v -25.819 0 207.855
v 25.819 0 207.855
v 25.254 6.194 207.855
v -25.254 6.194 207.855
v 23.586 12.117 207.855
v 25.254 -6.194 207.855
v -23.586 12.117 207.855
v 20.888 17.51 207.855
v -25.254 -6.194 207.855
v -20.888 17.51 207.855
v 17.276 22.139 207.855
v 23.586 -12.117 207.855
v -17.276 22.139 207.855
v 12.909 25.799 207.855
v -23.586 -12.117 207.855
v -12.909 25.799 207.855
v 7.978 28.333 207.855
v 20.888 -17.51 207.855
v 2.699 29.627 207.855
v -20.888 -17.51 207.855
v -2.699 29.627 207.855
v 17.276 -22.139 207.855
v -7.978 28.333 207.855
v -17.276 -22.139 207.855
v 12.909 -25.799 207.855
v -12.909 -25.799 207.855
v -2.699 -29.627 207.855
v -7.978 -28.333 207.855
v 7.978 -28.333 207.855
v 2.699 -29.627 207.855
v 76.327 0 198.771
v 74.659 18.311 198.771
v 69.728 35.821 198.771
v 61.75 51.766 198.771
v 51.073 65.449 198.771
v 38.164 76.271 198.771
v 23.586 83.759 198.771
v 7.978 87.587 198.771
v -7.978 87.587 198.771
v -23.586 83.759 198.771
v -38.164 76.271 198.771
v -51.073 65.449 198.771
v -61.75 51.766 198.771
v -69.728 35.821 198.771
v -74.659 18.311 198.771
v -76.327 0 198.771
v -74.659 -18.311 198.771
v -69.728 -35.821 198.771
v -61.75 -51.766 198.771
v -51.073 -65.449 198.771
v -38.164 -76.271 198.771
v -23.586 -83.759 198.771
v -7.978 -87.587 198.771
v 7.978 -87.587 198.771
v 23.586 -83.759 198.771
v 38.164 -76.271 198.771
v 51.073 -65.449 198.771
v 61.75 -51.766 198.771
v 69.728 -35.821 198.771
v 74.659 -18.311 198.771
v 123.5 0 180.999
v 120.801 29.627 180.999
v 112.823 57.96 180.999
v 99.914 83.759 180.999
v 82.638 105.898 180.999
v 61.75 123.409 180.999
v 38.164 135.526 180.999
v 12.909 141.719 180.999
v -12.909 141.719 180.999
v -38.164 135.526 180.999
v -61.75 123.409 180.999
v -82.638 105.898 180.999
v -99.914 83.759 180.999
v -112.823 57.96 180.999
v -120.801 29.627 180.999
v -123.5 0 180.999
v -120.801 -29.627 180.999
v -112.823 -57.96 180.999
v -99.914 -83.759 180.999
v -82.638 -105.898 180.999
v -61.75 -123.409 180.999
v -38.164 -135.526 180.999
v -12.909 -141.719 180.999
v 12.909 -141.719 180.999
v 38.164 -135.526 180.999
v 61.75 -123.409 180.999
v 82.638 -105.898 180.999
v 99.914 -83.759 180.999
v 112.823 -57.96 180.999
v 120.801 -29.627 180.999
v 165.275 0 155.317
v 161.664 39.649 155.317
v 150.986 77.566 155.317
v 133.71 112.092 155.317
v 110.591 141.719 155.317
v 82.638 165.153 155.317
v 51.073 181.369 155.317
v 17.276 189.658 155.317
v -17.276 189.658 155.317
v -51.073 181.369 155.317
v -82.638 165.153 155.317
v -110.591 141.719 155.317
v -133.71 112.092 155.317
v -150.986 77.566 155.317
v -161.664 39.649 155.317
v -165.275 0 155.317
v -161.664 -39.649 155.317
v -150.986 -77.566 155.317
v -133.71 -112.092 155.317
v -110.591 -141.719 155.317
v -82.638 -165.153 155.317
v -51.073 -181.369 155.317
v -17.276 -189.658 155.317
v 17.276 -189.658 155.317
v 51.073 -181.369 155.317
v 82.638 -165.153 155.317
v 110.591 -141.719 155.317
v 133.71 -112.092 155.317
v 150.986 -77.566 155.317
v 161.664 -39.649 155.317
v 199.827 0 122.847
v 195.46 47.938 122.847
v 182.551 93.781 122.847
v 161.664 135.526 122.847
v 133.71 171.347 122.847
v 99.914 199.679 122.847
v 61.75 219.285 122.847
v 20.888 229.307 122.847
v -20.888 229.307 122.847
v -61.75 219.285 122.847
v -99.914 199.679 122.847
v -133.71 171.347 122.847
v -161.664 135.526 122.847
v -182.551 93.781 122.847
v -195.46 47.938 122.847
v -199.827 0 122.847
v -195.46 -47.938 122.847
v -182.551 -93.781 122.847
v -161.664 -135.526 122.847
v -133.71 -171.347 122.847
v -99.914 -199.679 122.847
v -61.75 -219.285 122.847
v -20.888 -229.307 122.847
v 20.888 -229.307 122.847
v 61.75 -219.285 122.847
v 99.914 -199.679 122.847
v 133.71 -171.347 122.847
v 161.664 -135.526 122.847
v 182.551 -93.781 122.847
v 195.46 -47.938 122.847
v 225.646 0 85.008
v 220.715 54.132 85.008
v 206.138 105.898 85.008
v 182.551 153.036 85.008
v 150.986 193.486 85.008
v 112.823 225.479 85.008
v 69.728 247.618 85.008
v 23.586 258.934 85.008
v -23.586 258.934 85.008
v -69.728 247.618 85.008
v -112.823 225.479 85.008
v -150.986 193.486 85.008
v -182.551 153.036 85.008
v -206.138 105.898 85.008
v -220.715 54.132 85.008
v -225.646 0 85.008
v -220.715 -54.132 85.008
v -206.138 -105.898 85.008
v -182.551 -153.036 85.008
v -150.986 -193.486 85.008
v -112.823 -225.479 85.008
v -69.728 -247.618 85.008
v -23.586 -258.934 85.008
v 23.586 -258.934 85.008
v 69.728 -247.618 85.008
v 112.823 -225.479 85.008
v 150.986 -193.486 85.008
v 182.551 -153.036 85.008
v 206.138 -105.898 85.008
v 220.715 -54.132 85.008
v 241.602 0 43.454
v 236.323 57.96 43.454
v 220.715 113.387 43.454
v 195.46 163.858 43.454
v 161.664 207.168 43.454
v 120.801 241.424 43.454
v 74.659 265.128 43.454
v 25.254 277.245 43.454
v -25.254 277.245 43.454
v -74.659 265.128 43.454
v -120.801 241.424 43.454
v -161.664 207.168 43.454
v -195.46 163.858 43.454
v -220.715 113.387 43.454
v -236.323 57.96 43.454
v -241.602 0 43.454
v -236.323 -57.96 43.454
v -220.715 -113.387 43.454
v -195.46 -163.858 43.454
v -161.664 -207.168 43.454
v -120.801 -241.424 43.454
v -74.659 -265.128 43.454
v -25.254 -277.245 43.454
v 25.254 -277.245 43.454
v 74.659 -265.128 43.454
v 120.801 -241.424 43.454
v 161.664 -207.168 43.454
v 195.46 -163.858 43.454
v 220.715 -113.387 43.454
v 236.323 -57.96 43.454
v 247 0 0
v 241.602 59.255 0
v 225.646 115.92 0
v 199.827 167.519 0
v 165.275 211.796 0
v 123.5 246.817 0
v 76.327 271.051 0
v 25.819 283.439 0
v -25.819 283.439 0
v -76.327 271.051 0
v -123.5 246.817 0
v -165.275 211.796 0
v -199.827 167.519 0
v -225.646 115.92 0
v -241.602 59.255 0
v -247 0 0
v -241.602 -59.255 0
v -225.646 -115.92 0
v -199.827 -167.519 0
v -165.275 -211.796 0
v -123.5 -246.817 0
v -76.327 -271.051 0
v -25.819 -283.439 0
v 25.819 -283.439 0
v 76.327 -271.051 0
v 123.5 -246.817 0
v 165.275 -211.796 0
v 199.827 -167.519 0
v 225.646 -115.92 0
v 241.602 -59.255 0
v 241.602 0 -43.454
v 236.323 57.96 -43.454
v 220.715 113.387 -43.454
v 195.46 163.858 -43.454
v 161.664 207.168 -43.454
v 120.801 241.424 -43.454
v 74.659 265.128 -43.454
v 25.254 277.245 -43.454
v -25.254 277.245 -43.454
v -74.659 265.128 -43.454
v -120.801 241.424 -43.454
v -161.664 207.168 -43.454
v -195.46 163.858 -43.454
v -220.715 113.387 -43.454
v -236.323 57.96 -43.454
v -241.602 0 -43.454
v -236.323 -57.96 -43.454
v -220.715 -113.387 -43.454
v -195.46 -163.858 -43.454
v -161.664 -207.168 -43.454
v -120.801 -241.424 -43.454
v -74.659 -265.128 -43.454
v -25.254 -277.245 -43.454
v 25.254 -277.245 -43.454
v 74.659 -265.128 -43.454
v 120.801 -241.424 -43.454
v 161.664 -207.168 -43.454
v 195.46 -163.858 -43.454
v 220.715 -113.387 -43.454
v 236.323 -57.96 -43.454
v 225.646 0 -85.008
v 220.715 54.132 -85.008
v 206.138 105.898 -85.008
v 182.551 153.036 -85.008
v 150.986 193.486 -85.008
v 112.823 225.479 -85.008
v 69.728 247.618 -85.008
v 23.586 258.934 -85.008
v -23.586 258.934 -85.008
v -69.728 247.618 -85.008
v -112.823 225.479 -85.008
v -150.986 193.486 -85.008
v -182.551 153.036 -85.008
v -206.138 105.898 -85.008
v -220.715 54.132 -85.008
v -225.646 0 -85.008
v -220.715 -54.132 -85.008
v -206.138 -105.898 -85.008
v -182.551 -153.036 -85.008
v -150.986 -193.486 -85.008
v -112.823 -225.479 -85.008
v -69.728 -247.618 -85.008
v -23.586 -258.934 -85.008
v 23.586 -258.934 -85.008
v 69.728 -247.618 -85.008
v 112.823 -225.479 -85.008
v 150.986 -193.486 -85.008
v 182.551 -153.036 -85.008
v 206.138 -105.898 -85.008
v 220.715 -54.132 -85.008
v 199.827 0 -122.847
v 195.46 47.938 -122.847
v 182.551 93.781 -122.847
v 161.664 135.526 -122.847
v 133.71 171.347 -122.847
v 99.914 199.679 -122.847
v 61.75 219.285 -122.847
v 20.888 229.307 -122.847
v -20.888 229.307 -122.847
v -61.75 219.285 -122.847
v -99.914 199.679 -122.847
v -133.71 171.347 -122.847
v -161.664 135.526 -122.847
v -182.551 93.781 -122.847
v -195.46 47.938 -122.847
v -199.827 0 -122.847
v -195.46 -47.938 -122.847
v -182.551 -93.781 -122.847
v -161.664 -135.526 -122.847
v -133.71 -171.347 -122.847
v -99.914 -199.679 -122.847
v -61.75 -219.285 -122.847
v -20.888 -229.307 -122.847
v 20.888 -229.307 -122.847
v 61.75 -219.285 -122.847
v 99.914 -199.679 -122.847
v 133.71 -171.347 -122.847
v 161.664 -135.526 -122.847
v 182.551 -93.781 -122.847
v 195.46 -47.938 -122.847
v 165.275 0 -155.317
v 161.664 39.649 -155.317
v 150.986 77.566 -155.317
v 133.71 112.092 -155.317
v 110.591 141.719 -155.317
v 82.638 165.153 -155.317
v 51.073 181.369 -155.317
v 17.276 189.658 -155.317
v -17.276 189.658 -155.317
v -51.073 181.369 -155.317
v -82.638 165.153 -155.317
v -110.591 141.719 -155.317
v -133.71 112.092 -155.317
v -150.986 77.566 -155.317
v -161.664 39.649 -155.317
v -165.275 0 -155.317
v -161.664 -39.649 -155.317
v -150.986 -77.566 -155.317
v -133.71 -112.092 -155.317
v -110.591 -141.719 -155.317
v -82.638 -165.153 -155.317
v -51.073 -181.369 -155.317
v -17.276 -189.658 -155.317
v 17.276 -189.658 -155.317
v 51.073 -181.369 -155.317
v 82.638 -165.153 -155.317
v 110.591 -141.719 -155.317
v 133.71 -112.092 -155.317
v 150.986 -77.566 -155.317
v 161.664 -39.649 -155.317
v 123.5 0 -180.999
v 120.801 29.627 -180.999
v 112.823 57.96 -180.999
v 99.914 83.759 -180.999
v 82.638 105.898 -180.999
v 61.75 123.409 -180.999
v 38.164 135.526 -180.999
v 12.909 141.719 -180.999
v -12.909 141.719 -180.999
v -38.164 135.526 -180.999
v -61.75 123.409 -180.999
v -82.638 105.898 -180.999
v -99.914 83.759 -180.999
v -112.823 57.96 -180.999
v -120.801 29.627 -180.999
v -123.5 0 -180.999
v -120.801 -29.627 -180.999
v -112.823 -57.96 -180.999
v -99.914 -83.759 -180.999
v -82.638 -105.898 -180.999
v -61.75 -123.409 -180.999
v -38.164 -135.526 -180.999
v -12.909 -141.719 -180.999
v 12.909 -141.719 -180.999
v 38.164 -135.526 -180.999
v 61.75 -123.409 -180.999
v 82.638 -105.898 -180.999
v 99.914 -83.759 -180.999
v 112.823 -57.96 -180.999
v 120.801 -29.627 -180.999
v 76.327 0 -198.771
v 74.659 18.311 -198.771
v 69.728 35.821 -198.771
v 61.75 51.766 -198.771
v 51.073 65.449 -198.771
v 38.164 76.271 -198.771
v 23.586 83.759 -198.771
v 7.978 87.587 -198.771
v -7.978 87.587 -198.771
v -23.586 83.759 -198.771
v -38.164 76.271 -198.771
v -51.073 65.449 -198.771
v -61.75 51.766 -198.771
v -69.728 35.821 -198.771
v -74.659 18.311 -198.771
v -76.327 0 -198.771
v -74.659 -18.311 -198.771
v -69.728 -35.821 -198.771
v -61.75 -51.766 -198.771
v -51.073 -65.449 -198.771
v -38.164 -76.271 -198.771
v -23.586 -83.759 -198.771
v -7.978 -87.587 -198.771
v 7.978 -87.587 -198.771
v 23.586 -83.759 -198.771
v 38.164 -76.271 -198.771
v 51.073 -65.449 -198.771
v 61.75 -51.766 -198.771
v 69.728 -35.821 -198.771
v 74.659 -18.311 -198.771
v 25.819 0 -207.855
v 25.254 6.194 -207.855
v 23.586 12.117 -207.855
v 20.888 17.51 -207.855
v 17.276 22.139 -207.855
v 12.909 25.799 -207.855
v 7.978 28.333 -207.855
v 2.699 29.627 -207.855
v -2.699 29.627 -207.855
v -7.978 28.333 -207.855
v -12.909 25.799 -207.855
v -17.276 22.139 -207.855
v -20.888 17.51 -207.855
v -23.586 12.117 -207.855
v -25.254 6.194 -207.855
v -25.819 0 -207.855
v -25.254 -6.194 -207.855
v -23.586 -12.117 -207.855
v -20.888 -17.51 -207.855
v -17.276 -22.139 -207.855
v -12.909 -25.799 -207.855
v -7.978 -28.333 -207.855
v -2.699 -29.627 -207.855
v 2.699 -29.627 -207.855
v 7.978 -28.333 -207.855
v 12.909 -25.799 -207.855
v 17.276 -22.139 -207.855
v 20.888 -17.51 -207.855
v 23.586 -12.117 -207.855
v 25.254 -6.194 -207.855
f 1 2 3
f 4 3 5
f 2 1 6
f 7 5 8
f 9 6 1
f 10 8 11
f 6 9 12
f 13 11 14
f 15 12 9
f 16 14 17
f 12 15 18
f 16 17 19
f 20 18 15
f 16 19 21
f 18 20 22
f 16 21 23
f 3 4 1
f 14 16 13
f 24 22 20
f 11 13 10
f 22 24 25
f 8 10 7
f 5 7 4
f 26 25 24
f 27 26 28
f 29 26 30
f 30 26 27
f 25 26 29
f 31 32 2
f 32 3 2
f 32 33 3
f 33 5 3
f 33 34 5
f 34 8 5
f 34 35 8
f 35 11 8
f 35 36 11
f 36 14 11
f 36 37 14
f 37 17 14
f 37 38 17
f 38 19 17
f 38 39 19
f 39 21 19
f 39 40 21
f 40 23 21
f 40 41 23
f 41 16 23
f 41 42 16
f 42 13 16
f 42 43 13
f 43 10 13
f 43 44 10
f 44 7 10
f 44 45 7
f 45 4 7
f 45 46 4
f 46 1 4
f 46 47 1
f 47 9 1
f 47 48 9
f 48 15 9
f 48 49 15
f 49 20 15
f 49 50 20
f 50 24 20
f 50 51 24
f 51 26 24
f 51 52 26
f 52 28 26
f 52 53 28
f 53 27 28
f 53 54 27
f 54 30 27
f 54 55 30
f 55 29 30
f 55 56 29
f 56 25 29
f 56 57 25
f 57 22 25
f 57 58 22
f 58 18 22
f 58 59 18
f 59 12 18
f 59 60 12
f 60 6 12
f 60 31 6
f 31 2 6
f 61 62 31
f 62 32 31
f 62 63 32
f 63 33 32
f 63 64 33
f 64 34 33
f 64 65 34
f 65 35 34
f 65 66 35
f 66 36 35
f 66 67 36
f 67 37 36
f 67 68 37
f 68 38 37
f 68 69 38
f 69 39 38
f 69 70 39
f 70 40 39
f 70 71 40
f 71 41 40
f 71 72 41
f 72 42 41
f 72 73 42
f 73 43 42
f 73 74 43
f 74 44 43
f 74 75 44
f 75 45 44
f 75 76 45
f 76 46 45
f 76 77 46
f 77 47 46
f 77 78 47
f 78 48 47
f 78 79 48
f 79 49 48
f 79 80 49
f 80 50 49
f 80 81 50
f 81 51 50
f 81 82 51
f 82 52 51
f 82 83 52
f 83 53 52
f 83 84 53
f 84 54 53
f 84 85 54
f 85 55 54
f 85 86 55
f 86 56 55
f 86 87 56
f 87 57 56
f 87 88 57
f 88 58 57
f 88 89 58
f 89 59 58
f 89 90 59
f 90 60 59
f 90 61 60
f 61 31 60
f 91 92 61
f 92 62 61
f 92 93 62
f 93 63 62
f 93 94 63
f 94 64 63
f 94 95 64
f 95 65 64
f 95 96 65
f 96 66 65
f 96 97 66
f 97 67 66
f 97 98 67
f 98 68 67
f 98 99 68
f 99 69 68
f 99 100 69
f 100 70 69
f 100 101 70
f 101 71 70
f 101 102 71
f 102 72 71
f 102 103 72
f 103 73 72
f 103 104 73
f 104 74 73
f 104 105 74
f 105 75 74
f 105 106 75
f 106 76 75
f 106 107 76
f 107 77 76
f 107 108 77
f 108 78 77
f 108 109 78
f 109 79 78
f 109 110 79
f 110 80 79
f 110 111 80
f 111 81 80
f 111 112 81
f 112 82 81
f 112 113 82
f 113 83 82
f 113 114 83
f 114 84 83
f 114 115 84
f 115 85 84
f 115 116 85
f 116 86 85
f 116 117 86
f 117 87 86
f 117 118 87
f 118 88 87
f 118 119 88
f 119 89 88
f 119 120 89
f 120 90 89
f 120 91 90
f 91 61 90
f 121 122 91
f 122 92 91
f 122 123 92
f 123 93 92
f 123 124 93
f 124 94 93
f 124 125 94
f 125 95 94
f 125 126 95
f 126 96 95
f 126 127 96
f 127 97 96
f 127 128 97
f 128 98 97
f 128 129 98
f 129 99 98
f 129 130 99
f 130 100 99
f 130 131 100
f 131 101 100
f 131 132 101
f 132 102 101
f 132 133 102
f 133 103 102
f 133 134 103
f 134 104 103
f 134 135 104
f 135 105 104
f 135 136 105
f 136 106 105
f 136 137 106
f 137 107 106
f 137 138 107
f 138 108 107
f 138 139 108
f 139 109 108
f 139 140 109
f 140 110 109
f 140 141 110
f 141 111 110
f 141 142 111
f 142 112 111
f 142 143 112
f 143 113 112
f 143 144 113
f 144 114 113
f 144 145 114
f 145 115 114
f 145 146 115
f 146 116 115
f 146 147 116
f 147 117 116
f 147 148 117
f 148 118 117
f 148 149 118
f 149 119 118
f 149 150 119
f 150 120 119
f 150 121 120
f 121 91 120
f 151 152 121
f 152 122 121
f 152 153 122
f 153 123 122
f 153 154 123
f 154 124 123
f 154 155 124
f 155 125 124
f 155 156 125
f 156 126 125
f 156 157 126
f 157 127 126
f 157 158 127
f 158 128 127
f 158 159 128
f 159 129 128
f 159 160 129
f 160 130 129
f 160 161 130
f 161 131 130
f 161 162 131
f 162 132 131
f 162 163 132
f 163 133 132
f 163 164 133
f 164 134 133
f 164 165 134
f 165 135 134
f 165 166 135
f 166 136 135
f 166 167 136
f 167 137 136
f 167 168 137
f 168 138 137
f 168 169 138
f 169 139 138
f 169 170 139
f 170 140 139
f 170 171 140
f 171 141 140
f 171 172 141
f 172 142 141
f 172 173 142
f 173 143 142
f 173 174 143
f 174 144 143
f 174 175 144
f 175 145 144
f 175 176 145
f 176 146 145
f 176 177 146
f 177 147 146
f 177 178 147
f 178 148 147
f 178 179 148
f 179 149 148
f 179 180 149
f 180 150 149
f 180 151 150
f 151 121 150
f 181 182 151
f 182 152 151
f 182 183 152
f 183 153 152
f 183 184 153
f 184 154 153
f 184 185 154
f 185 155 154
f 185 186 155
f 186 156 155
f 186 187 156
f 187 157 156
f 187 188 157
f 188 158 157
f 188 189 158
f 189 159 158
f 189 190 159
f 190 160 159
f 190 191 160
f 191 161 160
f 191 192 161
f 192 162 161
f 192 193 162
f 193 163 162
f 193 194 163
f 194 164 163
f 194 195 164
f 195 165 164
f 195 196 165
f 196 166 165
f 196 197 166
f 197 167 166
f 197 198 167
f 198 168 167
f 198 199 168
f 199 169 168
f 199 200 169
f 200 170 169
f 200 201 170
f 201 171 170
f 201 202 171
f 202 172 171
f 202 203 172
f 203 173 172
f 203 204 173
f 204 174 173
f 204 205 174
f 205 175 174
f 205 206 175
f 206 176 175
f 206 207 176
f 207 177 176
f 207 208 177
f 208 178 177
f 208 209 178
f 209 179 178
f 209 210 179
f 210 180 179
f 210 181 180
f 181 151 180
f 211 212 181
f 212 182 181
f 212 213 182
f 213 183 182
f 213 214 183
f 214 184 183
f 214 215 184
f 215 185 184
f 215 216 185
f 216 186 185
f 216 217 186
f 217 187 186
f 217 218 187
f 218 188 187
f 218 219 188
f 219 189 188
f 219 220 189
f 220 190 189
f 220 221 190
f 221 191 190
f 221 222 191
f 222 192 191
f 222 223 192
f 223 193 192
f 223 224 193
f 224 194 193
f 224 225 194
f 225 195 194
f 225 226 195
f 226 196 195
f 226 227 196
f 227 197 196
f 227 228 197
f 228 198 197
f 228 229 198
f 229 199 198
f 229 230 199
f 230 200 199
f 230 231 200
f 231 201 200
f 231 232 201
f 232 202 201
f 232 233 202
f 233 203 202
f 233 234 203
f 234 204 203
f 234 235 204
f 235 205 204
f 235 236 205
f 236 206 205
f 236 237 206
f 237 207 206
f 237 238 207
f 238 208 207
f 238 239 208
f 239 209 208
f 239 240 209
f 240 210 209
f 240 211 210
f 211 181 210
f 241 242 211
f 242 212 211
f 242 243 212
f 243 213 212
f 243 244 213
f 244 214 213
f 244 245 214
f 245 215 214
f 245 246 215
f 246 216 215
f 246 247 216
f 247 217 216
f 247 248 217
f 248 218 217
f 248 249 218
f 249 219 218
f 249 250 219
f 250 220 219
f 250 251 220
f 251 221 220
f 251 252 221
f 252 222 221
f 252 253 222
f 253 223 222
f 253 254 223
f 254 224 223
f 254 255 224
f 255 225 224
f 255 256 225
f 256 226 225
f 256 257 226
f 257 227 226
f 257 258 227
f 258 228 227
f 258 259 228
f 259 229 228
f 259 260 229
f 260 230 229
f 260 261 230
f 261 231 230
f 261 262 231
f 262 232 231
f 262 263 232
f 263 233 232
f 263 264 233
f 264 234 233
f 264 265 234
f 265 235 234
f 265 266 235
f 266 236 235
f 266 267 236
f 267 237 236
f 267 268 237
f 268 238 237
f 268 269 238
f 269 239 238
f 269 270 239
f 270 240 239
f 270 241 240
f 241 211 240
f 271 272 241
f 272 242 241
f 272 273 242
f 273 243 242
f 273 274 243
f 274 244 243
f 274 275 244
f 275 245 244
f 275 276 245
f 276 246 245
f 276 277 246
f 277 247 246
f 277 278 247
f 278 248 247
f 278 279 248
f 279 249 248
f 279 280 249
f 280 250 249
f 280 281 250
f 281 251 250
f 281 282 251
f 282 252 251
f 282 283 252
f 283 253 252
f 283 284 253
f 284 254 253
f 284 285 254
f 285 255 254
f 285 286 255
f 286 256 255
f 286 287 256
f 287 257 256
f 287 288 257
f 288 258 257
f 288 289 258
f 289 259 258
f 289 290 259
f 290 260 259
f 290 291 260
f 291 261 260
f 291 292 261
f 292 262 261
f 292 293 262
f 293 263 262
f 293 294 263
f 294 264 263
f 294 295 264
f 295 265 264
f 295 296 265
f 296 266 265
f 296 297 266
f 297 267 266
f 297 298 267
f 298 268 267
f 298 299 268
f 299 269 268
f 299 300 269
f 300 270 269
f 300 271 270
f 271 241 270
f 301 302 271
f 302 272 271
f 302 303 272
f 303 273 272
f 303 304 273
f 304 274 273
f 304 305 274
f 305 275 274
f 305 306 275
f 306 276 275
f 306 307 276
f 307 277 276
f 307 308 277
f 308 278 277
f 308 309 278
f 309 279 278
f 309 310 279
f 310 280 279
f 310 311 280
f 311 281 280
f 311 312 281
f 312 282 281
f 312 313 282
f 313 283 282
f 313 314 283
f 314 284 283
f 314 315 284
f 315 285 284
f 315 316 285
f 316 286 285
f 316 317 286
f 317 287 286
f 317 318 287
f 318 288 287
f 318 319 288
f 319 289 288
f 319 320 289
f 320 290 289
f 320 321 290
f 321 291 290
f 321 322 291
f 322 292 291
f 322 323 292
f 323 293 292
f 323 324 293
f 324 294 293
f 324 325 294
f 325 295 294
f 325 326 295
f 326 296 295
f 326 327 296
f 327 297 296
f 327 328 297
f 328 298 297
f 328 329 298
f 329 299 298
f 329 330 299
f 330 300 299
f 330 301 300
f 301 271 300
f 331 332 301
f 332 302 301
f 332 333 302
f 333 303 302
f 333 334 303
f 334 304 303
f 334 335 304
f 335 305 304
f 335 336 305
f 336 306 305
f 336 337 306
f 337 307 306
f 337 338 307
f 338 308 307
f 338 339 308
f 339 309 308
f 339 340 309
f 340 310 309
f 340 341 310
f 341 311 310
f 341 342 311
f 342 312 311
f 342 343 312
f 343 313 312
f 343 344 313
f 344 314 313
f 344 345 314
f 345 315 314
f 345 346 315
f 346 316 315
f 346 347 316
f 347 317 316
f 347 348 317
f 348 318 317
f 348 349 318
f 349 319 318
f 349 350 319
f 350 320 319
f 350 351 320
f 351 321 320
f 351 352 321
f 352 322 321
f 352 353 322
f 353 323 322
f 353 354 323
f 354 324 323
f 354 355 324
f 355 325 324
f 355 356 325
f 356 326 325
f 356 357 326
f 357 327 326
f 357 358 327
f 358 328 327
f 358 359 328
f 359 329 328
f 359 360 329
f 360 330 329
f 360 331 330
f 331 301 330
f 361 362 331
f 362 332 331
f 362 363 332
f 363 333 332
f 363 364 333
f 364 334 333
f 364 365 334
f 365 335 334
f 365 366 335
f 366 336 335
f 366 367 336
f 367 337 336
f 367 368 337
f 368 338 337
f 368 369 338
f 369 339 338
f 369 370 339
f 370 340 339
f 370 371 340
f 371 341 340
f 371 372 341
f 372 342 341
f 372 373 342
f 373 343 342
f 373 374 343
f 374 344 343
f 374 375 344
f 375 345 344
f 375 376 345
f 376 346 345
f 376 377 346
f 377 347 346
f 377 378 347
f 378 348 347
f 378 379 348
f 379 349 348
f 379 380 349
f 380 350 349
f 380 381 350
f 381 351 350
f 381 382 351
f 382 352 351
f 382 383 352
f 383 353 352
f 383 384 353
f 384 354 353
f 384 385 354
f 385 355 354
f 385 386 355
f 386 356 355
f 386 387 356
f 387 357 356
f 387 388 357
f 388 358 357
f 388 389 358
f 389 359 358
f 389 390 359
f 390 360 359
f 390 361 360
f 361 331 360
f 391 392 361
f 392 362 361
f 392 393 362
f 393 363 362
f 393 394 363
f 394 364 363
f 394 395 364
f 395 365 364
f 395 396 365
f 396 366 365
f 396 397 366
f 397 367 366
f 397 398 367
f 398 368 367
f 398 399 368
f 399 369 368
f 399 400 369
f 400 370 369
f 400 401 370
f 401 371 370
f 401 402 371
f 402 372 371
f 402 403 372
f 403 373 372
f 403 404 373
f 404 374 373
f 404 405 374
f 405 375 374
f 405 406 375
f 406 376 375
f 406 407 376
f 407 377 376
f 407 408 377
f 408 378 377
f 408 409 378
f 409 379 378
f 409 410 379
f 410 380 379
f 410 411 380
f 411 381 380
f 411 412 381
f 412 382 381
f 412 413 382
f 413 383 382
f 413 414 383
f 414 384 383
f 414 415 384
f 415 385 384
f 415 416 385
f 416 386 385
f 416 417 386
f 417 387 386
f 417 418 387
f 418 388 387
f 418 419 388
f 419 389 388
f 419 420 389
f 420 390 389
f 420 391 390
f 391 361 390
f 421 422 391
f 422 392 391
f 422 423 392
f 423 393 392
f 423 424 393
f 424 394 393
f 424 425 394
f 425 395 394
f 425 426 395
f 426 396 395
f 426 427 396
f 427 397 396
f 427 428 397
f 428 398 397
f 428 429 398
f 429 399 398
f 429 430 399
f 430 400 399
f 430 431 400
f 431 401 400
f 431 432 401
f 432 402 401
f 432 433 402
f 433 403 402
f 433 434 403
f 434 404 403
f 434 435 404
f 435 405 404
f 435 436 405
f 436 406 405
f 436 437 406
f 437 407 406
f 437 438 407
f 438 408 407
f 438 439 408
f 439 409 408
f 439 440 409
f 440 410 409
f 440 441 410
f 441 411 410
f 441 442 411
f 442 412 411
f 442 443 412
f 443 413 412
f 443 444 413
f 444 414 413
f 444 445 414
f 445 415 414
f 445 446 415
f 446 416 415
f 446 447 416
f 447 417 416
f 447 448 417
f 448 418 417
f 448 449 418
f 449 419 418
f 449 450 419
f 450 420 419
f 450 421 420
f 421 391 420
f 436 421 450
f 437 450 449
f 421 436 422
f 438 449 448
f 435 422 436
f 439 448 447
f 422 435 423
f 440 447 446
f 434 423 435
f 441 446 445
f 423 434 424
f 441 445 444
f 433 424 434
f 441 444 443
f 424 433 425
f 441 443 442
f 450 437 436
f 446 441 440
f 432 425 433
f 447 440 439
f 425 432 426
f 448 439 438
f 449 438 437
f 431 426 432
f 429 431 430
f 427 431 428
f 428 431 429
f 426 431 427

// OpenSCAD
// Generated by SolidPython 1.0.1 on 2020-07-29 00:46:51


scale(v = [13, 15, 11]) {
	sphere(r = 19);
}
/***********************************************
*********      SolidPython code:      **********
************************************************
 
# import packages: SolidPython
from solid import *
from solid.utils import *
from itertools import chain, combinations, permutations


class Resize:

    def __init__(self, scad_file):
        self.scad_file = scad_file
        #self.scad_file = import_scad(scad_file)
        # cone/cylinder param:
        self.r1 = 0
        self.r2 = 0
        self.h = 0
        # rectangular prism param:
        self.w = 0
        self.l = 0
        # ellipse param:
        self.r = 0

    # import OpenScad code (file name corresponds to shape)


    # classify shape + parameters
    def assign(self, param1, param2, param3):
        if self.scad_file == 'cone.scad':
            self.r1 = param1
            self.r2 = param2
            self.h = param3
        elif self.scad_file == 'cylinder.scad':
            self.r1 = param1
            self.r2 = param2
            self.h = param3
        elif self.scad_file == 'rectangularPrism.scad':
            self.h = param1
            self.l = param2
            self.w = param3
        else:
            self.r = param1
            self.h = param2

    # resize parameters
    def iterate(self):
        x = range(3, 20, 2)
        i = 1
        if self.scad_file == 'cone.scad':
            tempList = list(permutations(x, 2))
            for temp in tempList:
                param1 = temp[0]
                param2 = temp[1]
                filepath = 'produced_scad_files/' + 'cone' + str(param1) + '_' + str(param2) + '_' + '.scad'
                scad_render_to_file(cylinder(h=param1, r1=param2, r2=0), filepath)

        elif self.scad_file == 'cylinder.scad':
            tempList = list(permutations(x, 3))
            for temp in tempList:
                param1 = temp[0]
                param2 = temp[1]
                filepath = 'produced_scad_files/' + 'cylinder' + str(param1) + '_' + str(param2) + '_' + '.scad'
                scad_render_to_file(cylinder(h=param1, r1=param2, r2=param2), filepath)

        elif self.scad_file == 'rectangularPrism.scad':
            tempList = list(permutations(x, 3))
            for temp in tempList:
                param1 = temp[0]
                param2 = temp[1]
                param3 = temp[2]
                filepath = 'produced_scad_files/' + 'rectangularPrism' + str(param1) + '_' + str(param2) + '_' + str(
                    param3) + '.scad'
                scad_render_to_file(cube(size=(param1, param2, param3)), filepath)

        elif self.scad_file == 'ellipse.scad':
            tempList = list(permutations(x, 4))
            for temp in tempList:
                param1 = temp[0]
                param2 = temp[1]
                param3 = temp[2]
                param4 = temp[3]
                filepath = 'produced_scad_files/' + 'ellipse' + str(param1) + '_' + str(param2) + '_' + str(param3) + '_' + str(param4) + '.scad'
                scad_render_to_file(scale([param1, param2, param3])(sphere(r=param4)), filepath)

    def render_to_scadfile(self):
        scad_render_to_file(scad, 'example.scad') 
 
************************************************/
